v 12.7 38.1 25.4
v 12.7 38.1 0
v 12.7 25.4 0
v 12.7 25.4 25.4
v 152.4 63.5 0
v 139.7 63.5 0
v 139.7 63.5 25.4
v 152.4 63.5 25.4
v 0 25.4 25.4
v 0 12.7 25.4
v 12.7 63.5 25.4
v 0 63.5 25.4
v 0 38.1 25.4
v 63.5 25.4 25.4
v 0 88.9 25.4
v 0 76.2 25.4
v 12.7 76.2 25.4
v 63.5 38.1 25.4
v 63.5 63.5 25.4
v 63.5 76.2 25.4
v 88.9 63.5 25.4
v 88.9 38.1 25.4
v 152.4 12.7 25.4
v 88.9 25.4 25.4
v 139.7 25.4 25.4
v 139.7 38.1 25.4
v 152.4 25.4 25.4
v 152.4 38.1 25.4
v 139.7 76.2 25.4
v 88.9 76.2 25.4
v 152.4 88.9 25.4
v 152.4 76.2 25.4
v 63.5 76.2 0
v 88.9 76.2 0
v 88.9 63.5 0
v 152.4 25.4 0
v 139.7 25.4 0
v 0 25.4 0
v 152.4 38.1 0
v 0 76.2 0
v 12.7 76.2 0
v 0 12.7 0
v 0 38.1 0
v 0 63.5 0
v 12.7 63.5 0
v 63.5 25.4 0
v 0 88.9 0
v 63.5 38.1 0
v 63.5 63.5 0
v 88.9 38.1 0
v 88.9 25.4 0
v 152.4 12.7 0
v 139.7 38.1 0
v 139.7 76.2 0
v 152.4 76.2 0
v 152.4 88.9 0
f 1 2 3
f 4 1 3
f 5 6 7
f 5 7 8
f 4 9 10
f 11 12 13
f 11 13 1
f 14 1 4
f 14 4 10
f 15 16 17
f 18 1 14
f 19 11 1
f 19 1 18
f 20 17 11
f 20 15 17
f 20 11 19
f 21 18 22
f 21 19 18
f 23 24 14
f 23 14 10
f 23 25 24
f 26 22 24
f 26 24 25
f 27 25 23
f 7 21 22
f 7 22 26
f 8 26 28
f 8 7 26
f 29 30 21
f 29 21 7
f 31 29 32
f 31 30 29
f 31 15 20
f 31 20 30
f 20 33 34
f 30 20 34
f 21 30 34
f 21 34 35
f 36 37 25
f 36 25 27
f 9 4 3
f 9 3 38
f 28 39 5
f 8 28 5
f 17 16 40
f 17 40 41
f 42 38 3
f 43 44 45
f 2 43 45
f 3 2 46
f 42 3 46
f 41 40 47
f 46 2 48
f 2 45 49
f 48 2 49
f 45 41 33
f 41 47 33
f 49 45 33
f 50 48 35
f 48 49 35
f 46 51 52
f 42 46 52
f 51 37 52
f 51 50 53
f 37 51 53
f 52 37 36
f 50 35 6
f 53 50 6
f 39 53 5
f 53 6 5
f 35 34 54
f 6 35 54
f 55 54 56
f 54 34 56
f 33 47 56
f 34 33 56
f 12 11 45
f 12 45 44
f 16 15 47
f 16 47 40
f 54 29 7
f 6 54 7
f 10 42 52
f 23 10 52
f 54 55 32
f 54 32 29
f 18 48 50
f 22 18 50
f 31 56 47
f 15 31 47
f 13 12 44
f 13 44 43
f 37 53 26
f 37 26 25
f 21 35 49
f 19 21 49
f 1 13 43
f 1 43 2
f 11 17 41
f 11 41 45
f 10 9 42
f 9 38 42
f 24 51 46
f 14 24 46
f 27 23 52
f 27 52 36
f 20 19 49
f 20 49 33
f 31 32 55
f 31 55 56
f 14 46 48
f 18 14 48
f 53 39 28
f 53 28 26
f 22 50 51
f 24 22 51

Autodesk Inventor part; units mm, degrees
ref_plane "YZ Plane" through (0, 0, 0) normal (1, 0, 0) x (0, 1, 0)
ref_plane "XZ Plane" through (0, 0, 0) normal (0, 1, 0) x (-1, 0, 0)
ref_plane "XY Plane" through (0, 0, 0) normal (0, 0, 1) x (1, 0, 0)
sketch "Sketch1" plane through (0, 0, 0) normal (0, 0, 1) x (1, 0, 0)
  line L0 (152.4, 12.7) -> (152.4, 76.2)
  line L1 (0, 76.2) -> (0, 0)
  line L2 (0, 76.2) -> (12.7, 76.2)
  line L3 (12.7, 76.2) -> (12.7, 63.5)
  line L4 (12.7, 63.5) -> (0, 63.5)
  line L5 (0, 63.5) -> (0, 76.2)
  line L6 (152.4, 76.2) -> (139.7, 76.2)
  line L7 (139.7, 76.2) -> (139.7, 63.5)
  line L8 (139.7, 63.5) -> (152.4, 63.5)
  line L9 (152.4, 63.5) -> (152.4, 76.2)
  line L10 (63.5, 76.2) -> (88.9, 76.2)
  line L11 (88.9, 76.2) -> (88.9, 63.5)
  line L12 (88.9, 63.5) -> (63.5, 63.5)
  line L13 (63.5, 63.5) -> (63.5, 76.2)
  line L14 (152.4, 76.2) -> (152.4, 88.9)
  line L15 (152.4, 88.9) -> (0, 88.9)
  line L16 (0, 88.9) -> (0, 76.2)
  line L17 (12.7, 38.1) -> (12.7, 25.4)
  line L18 (12.7, 25.4) -> (0, 25.4)
  line L19 (0, 25.4) -> (0, 38.1)
  line L20 (0, 38.1) -> (12.7, 38.1)
  line L21 (88.9, 25.4) -> (63.5, 25.4)
  line L22 (63.5, 25.4) -> (63.5, 38.1)
  line L23 (88.9, 38.1) -> (88.9, 25.4)
  line L24 (63.5, 38.1) -> (88.9, 38.1)
  line L25 (139.7, 38.1) -> (139.7, 25.4)
  line L26 (139.7, 25.4) -> (152.4, 25.4)
  line L27 (152.4, 25.4) -> (152.4, 38.1)
  line L28 (152.4, 38.1) -> (139.7, 38.1)
  line L29 (0, 76.2) -> (12.7, 76.2)
  line L30 (12.7, 76.2) -> (0, 76.2)
  line L31 (152.4, 76.2) -> (139.7, 76.2)
  line L32 (88.9, 76.2) -> (63.5, 76.2)
  line L33 (63.5, 76.2) -> (88.9, 76.2)
  line L34 (139.7, 76.2) -> (152.4, 76.2)
  line L35 (0, 12.7) -> (152.4, 12.7)
  point P0 (146.05, 76.2)
  point P1 (76.2, 76.2)
  point P2 (76.2, 38.1)
  point P3 (146.05, 38.1)
  point P4 (6.35, 25.4)
  point P5 (0, 63.5)
  point P6 (0, 25.4)
  dimension "d0" = 152.4
  dimension "d2" = 12.7
  dimension "d4" = 12.7
  dimension "d5" = 12.7
  dimension "d6" = 63.5
  dimension "d7" = 25.4
  dimension "d8" = 12.7
  dimension "d12" = 38.1
  dimension "d18" = 12.7
  dimension "d19" = 12.7
  dimension "d20" = 12.7
extrude "Extrusion1" add sketch "Sketch1" along normal blind 25.4 contours L35 L1 L18 L17 L20 L4 L3 L2 L16 L15 L14 L6 L7 L8 L0 L28 L25 L26
properties part number "Base"
